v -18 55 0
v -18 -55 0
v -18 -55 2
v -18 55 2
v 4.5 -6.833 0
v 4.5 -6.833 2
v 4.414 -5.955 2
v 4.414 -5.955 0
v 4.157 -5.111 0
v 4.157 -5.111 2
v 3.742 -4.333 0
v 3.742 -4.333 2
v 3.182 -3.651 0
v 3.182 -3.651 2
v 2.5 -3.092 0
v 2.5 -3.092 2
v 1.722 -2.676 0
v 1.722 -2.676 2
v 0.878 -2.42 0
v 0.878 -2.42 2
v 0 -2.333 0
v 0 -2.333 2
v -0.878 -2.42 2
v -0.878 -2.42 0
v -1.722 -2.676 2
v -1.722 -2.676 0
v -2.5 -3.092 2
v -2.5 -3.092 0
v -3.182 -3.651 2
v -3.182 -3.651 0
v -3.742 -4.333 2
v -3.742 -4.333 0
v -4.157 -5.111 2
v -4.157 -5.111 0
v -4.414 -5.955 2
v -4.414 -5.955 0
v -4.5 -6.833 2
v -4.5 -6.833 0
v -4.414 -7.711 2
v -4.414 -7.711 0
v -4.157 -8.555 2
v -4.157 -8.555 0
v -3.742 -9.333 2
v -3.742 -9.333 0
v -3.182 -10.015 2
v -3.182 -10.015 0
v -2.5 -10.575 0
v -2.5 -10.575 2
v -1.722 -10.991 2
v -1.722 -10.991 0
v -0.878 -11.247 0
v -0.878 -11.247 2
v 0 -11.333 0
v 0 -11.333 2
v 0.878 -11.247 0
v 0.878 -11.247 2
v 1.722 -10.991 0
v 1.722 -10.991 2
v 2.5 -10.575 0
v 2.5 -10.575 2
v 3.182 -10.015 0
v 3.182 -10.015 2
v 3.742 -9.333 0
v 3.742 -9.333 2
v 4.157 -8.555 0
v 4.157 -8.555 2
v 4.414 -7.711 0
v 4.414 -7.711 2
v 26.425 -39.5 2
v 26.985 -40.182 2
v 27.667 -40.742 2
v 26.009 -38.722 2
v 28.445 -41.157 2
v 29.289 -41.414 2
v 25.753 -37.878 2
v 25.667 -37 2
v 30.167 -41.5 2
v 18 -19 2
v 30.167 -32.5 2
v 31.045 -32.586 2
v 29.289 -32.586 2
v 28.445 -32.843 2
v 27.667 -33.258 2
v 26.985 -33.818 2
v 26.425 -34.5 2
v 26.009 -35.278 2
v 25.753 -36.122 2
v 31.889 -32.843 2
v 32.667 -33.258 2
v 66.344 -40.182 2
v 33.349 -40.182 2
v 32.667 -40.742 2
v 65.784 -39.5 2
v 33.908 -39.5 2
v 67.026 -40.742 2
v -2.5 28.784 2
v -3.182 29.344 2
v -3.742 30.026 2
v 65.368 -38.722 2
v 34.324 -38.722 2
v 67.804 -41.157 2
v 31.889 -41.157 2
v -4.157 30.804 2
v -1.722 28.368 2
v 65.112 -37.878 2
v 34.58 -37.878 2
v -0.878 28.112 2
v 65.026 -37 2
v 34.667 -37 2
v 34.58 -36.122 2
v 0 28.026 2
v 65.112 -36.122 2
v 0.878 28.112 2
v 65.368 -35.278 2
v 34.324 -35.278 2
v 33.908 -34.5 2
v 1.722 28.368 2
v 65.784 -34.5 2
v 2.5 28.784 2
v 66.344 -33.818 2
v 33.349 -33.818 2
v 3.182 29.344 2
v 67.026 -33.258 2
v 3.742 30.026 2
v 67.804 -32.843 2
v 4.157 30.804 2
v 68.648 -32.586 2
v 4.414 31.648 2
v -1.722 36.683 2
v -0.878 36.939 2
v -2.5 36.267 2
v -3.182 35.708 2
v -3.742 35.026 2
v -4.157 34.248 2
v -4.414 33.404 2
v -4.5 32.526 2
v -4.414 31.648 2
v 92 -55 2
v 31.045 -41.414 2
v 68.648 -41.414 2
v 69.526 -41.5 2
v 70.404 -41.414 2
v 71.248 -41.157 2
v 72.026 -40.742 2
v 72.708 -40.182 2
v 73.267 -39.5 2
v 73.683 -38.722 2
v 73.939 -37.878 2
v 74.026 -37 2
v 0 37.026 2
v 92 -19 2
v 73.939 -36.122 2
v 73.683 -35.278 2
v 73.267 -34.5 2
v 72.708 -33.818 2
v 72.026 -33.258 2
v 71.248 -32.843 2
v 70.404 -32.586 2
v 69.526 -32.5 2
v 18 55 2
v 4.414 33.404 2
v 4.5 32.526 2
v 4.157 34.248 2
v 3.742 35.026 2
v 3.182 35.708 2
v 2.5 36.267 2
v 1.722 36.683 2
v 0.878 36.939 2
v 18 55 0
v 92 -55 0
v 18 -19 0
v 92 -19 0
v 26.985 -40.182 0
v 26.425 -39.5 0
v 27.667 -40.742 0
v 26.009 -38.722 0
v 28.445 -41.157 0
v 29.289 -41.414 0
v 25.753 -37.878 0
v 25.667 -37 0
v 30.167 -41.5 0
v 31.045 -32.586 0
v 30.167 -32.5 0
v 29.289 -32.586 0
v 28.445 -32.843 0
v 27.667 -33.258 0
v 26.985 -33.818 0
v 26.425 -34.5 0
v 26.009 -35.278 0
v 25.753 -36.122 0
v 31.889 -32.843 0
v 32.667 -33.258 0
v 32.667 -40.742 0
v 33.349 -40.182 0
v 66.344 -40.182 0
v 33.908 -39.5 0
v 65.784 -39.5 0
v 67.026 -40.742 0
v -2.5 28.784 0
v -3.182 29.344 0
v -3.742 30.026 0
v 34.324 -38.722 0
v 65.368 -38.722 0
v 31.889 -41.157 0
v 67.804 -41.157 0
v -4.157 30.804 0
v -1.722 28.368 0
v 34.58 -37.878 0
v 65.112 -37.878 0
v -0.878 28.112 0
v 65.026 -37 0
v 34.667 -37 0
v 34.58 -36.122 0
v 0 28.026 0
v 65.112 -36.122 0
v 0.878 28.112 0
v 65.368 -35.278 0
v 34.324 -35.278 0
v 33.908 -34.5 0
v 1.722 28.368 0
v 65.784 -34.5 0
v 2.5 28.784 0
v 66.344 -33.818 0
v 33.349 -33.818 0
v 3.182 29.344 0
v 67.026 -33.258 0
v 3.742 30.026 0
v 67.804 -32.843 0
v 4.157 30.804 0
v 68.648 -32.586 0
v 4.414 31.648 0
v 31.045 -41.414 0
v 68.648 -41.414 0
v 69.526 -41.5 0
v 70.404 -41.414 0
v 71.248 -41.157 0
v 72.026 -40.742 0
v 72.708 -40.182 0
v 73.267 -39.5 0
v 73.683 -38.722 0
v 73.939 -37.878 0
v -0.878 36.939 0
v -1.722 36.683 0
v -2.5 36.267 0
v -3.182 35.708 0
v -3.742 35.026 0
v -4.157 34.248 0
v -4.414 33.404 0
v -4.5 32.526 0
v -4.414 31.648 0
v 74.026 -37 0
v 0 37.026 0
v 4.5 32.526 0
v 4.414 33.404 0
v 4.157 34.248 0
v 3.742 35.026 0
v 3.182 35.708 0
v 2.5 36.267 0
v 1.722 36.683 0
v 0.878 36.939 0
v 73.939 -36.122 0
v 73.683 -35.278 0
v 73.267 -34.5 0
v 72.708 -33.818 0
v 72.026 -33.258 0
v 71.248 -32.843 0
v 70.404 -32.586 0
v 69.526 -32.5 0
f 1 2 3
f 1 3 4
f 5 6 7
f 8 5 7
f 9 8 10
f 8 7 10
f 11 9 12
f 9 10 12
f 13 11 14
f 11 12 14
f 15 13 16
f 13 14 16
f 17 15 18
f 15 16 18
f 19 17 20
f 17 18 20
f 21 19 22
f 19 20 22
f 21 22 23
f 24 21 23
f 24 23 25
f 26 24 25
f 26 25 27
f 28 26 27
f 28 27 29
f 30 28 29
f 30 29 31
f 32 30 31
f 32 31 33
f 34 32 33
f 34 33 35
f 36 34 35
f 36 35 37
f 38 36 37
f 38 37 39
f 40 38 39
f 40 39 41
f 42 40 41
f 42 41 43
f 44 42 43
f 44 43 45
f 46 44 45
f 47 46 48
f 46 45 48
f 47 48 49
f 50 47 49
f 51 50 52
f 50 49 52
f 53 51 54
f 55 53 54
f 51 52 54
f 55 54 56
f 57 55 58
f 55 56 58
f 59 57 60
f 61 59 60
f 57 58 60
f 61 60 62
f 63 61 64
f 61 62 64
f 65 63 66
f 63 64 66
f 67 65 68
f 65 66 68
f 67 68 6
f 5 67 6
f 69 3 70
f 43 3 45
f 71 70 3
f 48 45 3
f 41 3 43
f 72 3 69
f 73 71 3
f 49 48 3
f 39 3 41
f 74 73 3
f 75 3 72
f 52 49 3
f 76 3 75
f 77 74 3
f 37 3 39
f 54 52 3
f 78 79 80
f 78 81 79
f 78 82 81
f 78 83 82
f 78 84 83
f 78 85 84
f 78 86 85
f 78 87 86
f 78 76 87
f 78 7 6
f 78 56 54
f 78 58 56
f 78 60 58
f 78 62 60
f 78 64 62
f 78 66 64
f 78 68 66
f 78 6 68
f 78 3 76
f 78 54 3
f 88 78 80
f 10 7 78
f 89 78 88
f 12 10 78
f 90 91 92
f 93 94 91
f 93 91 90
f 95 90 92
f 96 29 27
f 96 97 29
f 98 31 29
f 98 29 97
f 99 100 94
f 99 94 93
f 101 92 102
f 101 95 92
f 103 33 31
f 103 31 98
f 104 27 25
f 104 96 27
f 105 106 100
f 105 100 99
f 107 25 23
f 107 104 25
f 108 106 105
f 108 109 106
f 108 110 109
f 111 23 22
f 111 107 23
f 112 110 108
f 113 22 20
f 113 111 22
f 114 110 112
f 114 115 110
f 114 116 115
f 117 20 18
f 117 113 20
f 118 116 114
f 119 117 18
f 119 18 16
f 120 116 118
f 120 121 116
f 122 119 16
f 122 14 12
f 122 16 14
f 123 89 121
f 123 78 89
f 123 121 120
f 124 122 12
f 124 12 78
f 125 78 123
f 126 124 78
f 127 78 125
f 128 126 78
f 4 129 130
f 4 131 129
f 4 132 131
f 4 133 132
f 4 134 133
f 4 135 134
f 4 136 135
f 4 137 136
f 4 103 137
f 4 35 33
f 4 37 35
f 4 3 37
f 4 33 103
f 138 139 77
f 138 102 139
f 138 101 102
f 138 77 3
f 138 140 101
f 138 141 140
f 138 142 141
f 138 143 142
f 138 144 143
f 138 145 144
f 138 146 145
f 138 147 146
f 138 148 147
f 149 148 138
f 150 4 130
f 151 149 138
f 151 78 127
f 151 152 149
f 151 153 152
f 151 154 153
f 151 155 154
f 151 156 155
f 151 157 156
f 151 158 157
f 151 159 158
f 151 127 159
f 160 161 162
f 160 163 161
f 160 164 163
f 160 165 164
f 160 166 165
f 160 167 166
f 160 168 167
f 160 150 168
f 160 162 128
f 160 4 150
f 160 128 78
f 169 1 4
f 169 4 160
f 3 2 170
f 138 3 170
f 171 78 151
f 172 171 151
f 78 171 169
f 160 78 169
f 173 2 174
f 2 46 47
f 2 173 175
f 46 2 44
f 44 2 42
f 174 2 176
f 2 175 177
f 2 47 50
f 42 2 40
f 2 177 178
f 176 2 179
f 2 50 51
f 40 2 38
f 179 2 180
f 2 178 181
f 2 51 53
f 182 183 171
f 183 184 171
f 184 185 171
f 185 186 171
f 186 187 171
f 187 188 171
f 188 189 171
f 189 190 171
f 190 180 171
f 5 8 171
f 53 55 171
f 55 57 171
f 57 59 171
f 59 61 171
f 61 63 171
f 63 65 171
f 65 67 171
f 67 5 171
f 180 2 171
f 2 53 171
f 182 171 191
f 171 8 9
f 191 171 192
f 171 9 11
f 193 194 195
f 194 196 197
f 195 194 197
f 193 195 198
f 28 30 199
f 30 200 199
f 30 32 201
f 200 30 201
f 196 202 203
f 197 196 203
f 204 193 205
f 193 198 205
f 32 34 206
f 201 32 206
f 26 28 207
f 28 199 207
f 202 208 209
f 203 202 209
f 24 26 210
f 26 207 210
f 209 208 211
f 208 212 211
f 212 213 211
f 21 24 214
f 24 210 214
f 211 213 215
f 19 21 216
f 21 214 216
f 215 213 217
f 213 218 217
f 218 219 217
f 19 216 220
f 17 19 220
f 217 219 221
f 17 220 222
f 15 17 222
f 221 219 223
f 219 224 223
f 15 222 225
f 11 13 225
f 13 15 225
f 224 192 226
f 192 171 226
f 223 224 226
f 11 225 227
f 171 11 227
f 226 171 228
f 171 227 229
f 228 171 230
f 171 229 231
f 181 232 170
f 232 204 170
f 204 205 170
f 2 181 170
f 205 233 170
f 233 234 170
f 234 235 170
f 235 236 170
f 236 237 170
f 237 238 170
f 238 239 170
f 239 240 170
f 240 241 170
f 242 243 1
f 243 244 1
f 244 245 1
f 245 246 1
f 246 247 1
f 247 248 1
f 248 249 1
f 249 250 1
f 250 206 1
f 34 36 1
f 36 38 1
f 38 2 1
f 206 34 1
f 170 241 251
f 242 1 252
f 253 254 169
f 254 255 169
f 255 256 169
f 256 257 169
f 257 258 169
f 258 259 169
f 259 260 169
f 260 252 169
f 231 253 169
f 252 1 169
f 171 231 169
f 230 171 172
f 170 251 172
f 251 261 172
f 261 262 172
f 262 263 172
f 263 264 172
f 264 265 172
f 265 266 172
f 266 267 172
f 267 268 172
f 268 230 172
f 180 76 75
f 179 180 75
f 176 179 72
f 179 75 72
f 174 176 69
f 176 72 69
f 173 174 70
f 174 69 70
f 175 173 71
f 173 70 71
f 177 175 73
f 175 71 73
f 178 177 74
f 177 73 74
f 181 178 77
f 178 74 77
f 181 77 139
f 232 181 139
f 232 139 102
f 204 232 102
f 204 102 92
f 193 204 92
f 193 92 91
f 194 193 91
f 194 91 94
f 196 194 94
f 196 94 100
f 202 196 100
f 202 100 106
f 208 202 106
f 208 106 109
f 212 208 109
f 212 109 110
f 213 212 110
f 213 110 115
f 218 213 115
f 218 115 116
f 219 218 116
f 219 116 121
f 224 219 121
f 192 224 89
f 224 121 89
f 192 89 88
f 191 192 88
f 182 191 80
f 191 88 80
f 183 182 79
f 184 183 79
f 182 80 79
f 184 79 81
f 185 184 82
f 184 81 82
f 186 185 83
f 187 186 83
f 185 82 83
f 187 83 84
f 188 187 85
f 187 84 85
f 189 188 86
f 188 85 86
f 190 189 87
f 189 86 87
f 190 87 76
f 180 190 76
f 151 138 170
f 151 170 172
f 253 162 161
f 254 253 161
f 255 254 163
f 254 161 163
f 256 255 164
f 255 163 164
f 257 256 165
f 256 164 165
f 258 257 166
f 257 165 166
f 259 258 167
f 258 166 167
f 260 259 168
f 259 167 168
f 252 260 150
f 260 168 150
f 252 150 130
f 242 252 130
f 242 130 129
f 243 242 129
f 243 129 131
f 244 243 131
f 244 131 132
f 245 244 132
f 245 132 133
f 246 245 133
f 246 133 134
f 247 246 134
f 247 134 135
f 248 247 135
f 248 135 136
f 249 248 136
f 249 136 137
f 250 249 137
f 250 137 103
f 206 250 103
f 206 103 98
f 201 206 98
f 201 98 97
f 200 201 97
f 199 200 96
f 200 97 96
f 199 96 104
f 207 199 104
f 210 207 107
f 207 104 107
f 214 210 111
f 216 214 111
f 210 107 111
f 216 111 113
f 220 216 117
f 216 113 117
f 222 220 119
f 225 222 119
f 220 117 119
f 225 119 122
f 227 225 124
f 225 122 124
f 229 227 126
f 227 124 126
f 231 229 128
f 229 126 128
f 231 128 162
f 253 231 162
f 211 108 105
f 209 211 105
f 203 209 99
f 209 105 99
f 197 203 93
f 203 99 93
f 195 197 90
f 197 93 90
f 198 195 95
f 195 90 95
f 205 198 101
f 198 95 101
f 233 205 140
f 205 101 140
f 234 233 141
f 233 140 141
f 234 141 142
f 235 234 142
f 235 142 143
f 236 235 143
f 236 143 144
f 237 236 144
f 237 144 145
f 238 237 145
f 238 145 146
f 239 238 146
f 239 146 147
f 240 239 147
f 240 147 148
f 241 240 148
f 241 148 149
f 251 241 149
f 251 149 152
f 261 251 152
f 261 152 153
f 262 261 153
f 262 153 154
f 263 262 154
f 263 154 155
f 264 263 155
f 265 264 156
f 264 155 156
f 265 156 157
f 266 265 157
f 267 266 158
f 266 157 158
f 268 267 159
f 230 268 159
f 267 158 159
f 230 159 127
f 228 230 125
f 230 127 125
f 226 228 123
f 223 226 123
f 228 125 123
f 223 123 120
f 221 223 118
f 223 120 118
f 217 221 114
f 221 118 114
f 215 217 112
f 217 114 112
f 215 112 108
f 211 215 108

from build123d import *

# Parameters (mm, degrees)
SKETCH_1_W          = 36
SKETCH_1_H          = 110
EXTRUDE_1_DEPTH     = 2
SKETCH_2_W          = 110
SKETCH_2_H          = 36
EXTRUDE_2_DEPTH     = 2
SKETCH_3_R          = 4.5
CUT_EXTRUDE_1_DEPTH = 108.205410311


with BuildPart() as part:
    # 草图1 → 凸台-拉伸1 (new body)
    with BuildSketch(Plane.XY):
        Rectangle(SKETCH_1_W, SKETCH_1_H)
    extrude(amount=EXTRUDE_1_DEPTH)

    # 草图2 → 凸台-拉伸2 (add)
    with BuildSketch(Plane.XY.offset(2)):
        with Locations((37, -37)):
            Rectangle(SKETCH_2_W, SKETCH_2_H)
    extrude(amount=-EXTRUDE_2_DEPTH)

    # 草图3 → 切除-拉伸1 (cut, through all)
    with BuildSketch(Plane.XY.offset(2)):
        with Locations((0, 32.525719086)):
            Circle(SKETCH_3_R)
        with Locations((0, -6.833134262)):
            Circle(SKETCH_3_R)
        with Locations(Location((30.166865738, -37, 0), (0, 0, 180))):
            Circle(SKETCH_3_R)
        with Locations(Location((69.525719086, -37, 0), (0, 0, 180))):
            Circle(SKETCH_3_R)
    extrude(amount=-CUT_EXTRUDE_1_DEPTH, mode=Mode.SUBTRACT)


solid = part.part
